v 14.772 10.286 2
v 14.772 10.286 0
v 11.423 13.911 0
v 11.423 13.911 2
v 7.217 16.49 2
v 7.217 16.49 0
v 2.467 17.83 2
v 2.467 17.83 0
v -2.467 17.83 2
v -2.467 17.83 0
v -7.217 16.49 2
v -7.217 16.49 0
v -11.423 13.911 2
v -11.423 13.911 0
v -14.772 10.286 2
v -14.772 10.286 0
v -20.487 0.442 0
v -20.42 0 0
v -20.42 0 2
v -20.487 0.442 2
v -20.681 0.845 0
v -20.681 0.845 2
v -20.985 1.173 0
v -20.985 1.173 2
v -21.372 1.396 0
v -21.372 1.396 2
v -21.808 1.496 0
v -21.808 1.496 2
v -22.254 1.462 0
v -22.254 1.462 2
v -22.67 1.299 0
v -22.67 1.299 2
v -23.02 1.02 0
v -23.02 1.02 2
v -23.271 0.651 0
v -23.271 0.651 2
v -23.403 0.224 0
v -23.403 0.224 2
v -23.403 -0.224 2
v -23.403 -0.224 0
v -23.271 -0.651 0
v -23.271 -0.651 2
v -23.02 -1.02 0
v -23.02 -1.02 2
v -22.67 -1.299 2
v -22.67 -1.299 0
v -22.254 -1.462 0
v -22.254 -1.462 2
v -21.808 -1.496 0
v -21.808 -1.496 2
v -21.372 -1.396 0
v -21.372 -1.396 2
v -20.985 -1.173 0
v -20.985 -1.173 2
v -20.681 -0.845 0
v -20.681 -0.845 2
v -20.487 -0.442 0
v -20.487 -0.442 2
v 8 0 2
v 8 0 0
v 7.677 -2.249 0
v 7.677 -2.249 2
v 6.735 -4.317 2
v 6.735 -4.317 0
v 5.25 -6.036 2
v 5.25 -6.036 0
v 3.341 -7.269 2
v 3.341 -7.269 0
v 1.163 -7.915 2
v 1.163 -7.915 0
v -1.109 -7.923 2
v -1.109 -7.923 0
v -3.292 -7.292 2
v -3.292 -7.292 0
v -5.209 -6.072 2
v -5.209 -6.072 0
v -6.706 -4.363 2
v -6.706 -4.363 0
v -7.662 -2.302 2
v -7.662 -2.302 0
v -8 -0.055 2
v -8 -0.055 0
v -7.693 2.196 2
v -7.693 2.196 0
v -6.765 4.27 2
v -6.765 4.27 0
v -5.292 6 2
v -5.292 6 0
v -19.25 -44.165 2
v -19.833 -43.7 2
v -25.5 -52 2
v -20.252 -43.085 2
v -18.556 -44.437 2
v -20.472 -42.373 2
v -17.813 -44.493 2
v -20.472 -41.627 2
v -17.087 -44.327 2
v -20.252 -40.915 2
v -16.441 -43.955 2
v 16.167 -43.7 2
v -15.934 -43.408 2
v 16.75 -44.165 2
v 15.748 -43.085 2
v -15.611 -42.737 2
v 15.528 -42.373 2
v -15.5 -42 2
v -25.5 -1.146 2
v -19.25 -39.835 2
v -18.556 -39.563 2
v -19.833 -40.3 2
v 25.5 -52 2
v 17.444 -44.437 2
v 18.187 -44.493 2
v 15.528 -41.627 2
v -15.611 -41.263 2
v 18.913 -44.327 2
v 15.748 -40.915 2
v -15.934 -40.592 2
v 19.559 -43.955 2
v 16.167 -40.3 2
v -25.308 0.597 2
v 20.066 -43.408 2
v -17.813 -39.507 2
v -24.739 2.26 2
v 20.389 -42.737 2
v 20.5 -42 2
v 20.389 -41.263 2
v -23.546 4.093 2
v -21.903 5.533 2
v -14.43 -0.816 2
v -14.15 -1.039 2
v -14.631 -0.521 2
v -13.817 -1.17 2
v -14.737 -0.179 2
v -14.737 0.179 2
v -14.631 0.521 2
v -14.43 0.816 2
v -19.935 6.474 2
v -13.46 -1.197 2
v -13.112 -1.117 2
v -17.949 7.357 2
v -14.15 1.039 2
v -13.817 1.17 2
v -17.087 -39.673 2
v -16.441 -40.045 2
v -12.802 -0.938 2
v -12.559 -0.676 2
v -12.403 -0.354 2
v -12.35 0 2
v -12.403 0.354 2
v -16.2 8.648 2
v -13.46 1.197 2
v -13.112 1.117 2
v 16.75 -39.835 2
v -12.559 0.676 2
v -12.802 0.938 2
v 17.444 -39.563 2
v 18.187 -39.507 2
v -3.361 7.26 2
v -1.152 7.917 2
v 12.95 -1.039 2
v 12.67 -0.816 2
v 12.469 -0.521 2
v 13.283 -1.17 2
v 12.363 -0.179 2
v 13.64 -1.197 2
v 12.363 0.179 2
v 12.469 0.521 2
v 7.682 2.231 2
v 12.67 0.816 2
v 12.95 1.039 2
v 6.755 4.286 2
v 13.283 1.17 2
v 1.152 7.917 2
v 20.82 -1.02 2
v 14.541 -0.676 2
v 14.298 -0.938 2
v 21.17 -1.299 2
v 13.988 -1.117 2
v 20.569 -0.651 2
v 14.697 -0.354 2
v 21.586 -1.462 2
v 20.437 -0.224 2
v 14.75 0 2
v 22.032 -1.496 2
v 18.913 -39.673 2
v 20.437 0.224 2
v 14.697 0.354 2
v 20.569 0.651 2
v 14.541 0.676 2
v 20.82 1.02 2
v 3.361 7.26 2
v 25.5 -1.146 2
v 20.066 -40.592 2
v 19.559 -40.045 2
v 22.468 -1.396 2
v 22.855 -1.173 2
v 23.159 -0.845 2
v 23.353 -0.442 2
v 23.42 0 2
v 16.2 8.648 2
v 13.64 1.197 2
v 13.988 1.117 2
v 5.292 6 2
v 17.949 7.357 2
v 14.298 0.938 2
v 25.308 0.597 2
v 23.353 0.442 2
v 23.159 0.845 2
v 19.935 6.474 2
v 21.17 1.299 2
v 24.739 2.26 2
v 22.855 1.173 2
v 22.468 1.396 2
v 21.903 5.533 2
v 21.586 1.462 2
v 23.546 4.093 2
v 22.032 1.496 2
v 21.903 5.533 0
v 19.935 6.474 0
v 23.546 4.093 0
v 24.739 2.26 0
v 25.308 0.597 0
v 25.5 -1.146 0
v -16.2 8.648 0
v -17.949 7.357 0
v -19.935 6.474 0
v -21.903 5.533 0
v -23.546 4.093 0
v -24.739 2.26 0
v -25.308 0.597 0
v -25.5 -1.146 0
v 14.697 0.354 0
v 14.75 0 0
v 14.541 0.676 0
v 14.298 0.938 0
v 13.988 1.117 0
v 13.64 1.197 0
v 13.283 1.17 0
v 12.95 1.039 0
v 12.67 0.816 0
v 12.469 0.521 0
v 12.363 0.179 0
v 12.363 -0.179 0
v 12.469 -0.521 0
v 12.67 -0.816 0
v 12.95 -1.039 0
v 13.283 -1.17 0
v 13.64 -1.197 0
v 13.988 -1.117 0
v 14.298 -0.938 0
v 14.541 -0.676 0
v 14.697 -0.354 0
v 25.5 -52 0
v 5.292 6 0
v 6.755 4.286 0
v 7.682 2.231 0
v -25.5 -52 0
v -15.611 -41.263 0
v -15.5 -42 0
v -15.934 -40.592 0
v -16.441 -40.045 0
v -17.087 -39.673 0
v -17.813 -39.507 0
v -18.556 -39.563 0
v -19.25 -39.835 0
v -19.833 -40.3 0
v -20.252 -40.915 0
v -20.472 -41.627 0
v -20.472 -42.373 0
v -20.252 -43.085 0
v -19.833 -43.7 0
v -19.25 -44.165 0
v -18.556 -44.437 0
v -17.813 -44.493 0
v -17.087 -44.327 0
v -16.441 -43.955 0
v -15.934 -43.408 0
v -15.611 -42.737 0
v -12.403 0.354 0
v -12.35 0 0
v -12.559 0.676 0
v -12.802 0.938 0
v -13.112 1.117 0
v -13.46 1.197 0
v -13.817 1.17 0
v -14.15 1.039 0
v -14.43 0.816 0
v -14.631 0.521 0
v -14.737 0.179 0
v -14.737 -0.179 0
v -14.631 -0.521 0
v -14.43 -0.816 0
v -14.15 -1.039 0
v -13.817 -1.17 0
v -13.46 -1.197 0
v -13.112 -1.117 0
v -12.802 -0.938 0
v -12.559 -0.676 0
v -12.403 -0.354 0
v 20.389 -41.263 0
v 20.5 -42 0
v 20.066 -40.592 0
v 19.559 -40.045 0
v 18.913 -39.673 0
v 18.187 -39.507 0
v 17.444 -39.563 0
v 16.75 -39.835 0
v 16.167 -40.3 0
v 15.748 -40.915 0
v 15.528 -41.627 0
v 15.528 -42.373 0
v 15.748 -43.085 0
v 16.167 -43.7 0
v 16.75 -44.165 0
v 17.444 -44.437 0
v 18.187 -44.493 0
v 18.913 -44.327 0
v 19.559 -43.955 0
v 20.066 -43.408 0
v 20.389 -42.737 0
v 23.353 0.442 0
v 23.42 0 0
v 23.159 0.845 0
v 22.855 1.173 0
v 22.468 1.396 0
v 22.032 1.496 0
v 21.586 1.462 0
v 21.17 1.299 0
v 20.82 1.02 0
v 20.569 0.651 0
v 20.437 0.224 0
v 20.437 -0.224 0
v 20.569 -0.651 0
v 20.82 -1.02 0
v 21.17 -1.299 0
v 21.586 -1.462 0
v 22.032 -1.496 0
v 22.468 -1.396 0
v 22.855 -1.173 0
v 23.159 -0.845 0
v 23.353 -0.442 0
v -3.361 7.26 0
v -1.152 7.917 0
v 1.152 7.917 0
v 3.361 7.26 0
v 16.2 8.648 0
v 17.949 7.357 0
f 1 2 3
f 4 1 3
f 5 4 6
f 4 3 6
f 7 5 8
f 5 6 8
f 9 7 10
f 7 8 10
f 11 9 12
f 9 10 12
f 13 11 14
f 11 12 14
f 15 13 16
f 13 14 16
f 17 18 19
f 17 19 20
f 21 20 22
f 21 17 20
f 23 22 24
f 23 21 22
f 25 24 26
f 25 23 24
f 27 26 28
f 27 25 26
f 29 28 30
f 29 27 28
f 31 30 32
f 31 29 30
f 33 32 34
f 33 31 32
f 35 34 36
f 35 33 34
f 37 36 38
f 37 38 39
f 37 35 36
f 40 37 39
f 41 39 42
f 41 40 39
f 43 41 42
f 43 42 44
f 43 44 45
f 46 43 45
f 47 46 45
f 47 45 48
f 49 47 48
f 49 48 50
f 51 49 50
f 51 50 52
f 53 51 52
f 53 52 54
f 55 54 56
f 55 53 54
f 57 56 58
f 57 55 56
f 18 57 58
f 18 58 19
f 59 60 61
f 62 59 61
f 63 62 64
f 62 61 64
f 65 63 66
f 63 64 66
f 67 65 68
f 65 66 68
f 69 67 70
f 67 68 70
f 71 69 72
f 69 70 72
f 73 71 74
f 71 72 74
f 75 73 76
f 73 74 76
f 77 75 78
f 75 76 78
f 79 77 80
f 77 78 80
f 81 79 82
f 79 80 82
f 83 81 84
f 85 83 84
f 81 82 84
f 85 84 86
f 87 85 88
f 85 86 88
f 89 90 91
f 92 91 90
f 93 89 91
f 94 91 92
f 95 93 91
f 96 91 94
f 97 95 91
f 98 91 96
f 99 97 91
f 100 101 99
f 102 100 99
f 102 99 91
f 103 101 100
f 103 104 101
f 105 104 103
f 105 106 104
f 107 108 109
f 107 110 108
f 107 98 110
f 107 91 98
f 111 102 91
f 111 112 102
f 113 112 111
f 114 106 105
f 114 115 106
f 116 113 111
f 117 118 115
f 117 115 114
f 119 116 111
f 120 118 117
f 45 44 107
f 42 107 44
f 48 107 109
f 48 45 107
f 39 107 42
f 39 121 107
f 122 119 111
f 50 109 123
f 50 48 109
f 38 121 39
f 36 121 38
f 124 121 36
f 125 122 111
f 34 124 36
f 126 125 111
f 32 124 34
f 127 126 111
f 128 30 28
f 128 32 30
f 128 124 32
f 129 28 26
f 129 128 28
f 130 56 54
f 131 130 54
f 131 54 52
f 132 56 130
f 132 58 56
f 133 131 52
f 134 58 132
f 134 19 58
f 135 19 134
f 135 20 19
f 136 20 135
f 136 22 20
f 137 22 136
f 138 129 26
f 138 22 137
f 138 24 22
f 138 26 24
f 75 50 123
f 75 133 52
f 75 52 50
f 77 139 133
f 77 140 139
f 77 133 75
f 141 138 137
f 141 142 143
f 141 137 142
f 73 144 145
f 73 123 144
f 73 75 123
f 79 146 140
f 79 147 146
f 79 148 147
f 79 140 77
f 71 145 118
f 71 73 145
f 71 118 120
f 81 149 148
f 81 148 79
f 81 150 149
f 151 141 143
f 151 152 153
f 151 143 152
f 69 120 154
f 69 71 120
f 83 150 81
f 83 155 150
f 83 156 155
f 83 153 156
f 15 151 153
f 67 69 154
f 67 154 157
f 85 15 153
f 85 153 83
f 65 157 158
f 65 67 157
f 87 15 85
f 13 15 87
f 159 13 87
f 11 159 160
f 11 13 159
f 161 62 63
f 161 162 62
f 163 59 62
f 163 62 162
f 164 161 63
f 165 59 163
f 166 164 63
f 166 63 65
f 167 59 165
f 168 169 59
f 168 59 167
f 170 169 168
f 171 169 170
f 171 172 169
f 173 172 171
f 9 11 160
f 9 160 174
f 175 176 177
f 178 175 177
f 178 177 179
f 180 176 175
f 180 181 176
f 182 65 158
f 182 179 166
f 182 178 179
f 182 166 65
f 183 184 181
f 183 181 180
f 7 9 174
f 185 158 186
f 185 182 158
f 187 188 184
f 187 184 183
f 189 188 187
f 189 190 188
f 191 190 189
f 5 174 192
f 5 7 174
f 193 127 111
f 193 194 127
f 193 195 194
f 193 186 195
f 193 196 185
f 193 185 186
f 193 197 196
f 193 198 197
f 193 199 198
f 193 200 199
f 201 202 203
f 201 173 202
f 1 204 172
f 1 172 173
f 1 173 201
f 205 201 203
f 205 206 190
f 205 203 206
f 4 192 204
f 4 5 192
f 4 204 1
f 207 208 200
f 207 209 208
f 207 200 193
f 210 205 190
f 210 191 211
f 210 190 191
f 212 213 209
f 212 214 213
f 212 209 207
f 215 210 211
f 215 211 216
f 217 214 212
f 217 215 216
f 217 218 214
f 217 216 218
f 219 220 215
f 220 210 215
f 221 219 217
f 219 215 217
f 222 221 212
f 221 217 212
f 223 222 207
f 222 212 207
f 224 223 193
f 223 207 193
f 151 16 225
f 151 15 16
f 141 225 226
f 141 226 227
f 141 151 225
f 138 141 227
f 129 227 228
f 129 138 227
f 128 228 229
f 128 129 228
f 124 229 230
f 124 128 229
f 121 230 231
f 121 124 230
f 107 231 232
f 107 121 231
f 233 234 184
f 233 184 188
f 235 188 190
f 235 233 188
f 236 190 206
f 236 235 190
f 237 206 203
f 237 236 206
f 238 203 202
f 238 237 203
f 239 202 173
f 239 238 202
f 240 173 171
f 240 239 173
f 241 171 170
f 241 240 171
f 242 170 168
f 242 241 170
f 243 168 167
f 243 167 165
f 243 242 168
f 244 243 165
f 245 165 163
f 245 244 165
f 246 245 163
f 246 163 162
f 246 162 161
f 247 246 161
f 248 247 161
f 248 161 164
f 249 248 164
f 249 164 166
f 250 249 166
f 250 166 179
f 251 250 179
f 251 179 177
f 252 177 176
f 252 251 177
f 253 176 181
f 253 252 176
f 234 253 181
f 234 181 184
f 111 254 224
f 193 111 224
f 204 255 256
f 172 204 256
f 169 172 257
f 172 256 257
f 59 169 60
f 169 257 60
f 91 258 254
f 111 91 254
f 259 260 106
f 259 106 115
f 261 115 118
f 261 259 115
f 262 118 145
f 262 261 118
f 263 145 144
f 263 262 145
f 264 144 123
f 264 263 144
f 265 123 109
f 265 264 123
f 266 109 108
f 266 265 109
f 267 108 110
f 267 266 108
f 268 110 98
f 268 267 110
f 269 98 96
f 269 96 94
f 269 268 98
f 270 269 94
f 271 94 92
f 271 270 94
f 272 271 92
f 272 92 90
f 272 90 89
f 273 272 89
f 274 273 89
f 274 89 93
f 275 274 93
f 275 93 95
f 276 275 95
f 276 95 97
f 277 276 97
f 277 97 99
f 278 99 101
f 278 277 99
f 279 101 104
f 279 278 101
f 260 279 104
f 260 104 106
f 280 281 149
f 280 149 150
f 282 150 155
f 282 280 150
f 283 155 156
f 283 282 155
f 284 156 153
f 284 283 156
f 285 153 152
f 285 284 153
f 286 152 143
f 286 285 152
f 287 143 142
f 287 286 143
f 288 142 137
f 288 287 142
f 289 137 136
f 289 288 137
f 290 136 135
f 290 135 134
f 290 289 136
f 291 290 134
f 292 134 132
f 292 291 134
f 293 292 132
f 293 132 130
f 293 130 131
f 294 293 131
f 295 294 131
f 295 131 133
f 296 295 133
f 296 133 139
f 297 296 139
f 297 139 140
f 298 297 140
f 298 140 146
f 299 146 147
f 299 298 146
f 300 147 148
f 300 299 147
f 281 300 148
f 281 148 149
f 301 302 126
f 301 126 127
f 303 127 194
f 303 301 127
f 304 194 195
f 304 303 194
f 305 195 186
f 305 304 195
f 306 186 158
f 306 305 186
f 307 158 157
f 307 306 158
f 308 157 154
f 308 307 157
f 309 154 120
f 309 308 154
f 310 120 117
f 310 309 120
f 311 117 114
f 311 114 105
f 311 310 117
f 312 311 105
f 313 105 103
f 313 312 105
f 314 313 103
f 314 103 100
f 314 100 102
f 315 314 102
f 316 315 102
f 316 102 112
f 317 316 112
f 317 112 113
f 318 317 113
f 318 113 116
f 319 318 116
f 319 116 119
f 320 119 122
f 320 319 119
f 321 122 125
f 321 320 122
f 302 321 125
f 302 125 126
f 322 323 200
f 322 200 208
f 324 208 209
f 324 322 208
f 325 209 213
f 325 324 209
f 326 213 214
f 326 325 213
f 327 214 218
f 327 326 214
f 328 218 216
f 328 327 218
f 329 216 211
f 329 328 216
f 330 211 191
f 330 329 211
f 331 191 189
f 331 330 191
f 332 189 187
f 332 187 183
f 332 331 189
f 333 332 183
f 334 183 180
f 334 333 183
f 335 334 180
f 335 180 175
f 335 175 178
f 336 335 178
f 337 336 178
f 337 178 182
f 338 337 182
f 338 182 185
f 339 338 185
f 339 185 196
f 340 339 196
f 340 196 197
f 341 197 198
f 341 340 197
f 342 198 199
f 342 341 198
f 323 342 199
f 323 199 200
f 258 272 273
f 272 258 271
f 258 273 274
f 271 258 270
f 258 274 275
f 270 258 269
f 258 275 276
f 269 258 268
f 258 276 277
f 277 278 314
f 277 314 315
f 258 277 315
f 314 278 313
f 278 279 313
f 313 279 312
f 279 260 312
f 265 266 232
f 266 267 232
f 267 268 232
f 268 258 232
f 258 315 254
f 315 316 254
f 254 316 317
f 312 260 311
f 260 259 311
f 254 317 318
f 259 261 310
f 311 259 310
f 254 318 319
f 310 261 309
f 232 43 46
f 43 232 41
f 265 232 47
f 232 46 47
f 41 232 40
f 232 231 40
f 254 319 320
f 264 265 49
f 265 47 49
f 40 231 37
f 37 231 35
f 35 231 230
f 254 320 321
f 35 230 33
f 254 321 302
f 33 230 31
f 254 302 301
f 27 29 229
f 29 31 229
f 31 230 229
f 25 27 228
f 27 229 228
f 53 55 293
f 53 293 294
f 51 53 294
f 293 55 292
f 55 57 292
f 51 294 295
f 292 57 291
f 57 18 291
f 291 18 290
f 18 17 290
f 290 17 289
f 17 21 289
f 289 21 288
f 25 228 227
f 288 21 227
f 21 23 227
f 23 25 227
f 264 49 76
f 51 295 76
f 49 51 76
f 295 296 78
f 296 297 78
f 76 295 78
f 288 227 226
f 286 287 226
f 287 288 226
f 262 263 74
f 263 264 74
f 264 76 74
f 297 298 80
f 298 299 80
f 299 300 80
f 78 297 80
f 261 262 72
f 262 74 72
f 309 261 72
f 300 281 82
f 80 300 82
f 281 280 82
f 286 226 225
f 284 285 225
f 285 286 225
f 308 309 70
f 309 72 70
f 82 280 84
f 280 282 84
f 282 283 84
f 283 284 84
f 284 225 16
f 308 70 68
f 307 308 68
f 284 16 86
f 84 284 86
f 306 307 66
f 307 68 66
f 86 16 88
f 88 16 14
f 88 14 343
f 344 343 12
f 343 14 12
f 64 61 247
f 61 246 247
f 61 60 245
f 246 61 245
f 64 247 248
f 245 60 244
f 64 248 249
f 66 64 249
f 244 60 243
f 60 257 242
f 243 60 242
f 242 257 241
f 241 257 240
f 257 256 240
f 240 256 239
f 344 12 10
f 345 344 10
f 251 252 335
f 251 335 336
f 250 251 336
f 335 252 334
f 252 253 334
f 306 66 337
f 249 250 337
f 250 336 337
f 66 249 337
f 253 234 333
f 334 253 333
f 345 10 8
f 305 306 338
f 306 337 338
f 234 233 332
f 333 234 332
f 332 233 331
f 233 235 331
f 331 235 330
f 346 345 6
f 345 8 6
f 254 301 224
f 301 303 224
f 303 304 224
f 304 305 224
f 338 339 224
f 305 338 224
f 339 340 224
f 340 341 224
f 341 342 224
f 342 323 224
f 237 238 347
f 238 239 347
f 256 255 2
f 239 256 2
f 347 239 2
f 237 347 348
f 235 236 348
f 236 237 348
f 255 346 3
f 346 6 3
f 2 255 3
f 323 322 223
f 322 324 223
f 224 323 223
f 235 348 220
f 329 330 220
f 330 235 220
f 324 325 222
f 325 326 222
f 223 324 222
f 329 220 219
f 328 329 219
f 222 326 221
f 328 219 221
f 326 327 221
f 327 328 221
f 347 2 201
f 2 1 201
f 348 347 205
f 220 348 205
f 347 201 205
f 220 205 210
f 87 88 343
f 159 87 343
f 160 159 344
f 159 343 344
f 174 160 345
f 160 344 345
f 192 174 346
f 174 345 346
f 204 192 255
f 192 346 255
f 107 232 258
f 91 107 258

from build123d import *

# Parameters (mm, degrees)
F0_R     = 1.2
F0_R_2   = 2.5
F0_R_3   = 1.5
F1_DEPTH = 2
F2_R     = 10
F3_R     = 8


with BuildPart() as f1:
    # F0 (on Top) → F1 (new body)
    with BuildSketch(Plane.XY):
        with BuildLine():
            ThreePointArc((-5.2915026221, 6), (0, 8), (5.2915026221, 6))
            Line((5.2915026221, 6), (16.9705627485, 6))
            ThreePointArc((16.9705627485, 6), (0, 18), (-16.9705627485, 6))
            Line((-16.9705627485, 6), (-5.2915026221, 6))
        make_face()
        with BuildLine():
            ThreePointArc((5.2915026221, 6), (7.2915026221, 3.2915026221), (8, 0))
            ThreePointArc((8, 0), (-3.2915026221, -7.2915026221), (-5.2915026221, 6))
            Line((-5.2915026221, 6), (-16.9705627485, 6))
            ThreePointArc((-16.9705627485, 6), (-3.0438356171, -17.7407740738), (18, 0))
            ThreePointArc((18, 0), (17.7407740738, 3.0438356171), (16.9705627485, 6))
            Line((16.9705627485, 6), (5.2915026221, 6))
        make_face()
        with Locations((-13.55, 0)):
            Circle(F0_R, mode=Mode.SUBTRACT)
        with Locations((13.55, 0)):
            Circle(F0_R, mode=Mode.SUBTRACT)
        with BuildLine():
            Line((25.5, 6), (16.9705627485, 6))
            ThreePointArc((16.9705627485, 6), (17.7407740738, 3.0438356171), (18, 0))
            ThreePointArc((18, 0), (-3.0438356171, -17.7407740738), (-16.9705627485, 6))
            Line((-16.9705627485, 6), (-25.5, 6))
            Line((-25.5, 6), (-25.5, -52))
            Line((-25.5, -52), (25.5, -52))
            Line((25.5, -52), (25.5, 6))
        make_face()
        with Locations((-18, -42)):
            Circle(F0_R_2, mode=Mode.SUBTRACT)
        with Locations((18, -42)):
            Circle(F0_R_2, mode=Mode.SUBTRACT)
        with Locations((-21.92, 0)):
            Circle(F0_R_3, mode=Mode.SUBTRACT)
        with Locations((21.92, 0)):
            Circle(F0_R_3, mode=Mode.SUBTRACT)
    extrude(amount=F1_DEPTH)

    # F2
    f2_edges = [f1.edges().sort_by_distance(p)[0] for p in [
        (-16.970563, 6, 1),
        (16.970563, 6, 1),
    ]]
    fillet(f2_edges, radius=F2_R)

    # F3
    f3_edges = [f1.edges().sort_by_distance(p)[0] for p in [
        (25.5, 6, 1),
        (-25.5, 6, 1),
    ]]
    fillet(f3_edges, radius=F3_R)


solid = f1.part
